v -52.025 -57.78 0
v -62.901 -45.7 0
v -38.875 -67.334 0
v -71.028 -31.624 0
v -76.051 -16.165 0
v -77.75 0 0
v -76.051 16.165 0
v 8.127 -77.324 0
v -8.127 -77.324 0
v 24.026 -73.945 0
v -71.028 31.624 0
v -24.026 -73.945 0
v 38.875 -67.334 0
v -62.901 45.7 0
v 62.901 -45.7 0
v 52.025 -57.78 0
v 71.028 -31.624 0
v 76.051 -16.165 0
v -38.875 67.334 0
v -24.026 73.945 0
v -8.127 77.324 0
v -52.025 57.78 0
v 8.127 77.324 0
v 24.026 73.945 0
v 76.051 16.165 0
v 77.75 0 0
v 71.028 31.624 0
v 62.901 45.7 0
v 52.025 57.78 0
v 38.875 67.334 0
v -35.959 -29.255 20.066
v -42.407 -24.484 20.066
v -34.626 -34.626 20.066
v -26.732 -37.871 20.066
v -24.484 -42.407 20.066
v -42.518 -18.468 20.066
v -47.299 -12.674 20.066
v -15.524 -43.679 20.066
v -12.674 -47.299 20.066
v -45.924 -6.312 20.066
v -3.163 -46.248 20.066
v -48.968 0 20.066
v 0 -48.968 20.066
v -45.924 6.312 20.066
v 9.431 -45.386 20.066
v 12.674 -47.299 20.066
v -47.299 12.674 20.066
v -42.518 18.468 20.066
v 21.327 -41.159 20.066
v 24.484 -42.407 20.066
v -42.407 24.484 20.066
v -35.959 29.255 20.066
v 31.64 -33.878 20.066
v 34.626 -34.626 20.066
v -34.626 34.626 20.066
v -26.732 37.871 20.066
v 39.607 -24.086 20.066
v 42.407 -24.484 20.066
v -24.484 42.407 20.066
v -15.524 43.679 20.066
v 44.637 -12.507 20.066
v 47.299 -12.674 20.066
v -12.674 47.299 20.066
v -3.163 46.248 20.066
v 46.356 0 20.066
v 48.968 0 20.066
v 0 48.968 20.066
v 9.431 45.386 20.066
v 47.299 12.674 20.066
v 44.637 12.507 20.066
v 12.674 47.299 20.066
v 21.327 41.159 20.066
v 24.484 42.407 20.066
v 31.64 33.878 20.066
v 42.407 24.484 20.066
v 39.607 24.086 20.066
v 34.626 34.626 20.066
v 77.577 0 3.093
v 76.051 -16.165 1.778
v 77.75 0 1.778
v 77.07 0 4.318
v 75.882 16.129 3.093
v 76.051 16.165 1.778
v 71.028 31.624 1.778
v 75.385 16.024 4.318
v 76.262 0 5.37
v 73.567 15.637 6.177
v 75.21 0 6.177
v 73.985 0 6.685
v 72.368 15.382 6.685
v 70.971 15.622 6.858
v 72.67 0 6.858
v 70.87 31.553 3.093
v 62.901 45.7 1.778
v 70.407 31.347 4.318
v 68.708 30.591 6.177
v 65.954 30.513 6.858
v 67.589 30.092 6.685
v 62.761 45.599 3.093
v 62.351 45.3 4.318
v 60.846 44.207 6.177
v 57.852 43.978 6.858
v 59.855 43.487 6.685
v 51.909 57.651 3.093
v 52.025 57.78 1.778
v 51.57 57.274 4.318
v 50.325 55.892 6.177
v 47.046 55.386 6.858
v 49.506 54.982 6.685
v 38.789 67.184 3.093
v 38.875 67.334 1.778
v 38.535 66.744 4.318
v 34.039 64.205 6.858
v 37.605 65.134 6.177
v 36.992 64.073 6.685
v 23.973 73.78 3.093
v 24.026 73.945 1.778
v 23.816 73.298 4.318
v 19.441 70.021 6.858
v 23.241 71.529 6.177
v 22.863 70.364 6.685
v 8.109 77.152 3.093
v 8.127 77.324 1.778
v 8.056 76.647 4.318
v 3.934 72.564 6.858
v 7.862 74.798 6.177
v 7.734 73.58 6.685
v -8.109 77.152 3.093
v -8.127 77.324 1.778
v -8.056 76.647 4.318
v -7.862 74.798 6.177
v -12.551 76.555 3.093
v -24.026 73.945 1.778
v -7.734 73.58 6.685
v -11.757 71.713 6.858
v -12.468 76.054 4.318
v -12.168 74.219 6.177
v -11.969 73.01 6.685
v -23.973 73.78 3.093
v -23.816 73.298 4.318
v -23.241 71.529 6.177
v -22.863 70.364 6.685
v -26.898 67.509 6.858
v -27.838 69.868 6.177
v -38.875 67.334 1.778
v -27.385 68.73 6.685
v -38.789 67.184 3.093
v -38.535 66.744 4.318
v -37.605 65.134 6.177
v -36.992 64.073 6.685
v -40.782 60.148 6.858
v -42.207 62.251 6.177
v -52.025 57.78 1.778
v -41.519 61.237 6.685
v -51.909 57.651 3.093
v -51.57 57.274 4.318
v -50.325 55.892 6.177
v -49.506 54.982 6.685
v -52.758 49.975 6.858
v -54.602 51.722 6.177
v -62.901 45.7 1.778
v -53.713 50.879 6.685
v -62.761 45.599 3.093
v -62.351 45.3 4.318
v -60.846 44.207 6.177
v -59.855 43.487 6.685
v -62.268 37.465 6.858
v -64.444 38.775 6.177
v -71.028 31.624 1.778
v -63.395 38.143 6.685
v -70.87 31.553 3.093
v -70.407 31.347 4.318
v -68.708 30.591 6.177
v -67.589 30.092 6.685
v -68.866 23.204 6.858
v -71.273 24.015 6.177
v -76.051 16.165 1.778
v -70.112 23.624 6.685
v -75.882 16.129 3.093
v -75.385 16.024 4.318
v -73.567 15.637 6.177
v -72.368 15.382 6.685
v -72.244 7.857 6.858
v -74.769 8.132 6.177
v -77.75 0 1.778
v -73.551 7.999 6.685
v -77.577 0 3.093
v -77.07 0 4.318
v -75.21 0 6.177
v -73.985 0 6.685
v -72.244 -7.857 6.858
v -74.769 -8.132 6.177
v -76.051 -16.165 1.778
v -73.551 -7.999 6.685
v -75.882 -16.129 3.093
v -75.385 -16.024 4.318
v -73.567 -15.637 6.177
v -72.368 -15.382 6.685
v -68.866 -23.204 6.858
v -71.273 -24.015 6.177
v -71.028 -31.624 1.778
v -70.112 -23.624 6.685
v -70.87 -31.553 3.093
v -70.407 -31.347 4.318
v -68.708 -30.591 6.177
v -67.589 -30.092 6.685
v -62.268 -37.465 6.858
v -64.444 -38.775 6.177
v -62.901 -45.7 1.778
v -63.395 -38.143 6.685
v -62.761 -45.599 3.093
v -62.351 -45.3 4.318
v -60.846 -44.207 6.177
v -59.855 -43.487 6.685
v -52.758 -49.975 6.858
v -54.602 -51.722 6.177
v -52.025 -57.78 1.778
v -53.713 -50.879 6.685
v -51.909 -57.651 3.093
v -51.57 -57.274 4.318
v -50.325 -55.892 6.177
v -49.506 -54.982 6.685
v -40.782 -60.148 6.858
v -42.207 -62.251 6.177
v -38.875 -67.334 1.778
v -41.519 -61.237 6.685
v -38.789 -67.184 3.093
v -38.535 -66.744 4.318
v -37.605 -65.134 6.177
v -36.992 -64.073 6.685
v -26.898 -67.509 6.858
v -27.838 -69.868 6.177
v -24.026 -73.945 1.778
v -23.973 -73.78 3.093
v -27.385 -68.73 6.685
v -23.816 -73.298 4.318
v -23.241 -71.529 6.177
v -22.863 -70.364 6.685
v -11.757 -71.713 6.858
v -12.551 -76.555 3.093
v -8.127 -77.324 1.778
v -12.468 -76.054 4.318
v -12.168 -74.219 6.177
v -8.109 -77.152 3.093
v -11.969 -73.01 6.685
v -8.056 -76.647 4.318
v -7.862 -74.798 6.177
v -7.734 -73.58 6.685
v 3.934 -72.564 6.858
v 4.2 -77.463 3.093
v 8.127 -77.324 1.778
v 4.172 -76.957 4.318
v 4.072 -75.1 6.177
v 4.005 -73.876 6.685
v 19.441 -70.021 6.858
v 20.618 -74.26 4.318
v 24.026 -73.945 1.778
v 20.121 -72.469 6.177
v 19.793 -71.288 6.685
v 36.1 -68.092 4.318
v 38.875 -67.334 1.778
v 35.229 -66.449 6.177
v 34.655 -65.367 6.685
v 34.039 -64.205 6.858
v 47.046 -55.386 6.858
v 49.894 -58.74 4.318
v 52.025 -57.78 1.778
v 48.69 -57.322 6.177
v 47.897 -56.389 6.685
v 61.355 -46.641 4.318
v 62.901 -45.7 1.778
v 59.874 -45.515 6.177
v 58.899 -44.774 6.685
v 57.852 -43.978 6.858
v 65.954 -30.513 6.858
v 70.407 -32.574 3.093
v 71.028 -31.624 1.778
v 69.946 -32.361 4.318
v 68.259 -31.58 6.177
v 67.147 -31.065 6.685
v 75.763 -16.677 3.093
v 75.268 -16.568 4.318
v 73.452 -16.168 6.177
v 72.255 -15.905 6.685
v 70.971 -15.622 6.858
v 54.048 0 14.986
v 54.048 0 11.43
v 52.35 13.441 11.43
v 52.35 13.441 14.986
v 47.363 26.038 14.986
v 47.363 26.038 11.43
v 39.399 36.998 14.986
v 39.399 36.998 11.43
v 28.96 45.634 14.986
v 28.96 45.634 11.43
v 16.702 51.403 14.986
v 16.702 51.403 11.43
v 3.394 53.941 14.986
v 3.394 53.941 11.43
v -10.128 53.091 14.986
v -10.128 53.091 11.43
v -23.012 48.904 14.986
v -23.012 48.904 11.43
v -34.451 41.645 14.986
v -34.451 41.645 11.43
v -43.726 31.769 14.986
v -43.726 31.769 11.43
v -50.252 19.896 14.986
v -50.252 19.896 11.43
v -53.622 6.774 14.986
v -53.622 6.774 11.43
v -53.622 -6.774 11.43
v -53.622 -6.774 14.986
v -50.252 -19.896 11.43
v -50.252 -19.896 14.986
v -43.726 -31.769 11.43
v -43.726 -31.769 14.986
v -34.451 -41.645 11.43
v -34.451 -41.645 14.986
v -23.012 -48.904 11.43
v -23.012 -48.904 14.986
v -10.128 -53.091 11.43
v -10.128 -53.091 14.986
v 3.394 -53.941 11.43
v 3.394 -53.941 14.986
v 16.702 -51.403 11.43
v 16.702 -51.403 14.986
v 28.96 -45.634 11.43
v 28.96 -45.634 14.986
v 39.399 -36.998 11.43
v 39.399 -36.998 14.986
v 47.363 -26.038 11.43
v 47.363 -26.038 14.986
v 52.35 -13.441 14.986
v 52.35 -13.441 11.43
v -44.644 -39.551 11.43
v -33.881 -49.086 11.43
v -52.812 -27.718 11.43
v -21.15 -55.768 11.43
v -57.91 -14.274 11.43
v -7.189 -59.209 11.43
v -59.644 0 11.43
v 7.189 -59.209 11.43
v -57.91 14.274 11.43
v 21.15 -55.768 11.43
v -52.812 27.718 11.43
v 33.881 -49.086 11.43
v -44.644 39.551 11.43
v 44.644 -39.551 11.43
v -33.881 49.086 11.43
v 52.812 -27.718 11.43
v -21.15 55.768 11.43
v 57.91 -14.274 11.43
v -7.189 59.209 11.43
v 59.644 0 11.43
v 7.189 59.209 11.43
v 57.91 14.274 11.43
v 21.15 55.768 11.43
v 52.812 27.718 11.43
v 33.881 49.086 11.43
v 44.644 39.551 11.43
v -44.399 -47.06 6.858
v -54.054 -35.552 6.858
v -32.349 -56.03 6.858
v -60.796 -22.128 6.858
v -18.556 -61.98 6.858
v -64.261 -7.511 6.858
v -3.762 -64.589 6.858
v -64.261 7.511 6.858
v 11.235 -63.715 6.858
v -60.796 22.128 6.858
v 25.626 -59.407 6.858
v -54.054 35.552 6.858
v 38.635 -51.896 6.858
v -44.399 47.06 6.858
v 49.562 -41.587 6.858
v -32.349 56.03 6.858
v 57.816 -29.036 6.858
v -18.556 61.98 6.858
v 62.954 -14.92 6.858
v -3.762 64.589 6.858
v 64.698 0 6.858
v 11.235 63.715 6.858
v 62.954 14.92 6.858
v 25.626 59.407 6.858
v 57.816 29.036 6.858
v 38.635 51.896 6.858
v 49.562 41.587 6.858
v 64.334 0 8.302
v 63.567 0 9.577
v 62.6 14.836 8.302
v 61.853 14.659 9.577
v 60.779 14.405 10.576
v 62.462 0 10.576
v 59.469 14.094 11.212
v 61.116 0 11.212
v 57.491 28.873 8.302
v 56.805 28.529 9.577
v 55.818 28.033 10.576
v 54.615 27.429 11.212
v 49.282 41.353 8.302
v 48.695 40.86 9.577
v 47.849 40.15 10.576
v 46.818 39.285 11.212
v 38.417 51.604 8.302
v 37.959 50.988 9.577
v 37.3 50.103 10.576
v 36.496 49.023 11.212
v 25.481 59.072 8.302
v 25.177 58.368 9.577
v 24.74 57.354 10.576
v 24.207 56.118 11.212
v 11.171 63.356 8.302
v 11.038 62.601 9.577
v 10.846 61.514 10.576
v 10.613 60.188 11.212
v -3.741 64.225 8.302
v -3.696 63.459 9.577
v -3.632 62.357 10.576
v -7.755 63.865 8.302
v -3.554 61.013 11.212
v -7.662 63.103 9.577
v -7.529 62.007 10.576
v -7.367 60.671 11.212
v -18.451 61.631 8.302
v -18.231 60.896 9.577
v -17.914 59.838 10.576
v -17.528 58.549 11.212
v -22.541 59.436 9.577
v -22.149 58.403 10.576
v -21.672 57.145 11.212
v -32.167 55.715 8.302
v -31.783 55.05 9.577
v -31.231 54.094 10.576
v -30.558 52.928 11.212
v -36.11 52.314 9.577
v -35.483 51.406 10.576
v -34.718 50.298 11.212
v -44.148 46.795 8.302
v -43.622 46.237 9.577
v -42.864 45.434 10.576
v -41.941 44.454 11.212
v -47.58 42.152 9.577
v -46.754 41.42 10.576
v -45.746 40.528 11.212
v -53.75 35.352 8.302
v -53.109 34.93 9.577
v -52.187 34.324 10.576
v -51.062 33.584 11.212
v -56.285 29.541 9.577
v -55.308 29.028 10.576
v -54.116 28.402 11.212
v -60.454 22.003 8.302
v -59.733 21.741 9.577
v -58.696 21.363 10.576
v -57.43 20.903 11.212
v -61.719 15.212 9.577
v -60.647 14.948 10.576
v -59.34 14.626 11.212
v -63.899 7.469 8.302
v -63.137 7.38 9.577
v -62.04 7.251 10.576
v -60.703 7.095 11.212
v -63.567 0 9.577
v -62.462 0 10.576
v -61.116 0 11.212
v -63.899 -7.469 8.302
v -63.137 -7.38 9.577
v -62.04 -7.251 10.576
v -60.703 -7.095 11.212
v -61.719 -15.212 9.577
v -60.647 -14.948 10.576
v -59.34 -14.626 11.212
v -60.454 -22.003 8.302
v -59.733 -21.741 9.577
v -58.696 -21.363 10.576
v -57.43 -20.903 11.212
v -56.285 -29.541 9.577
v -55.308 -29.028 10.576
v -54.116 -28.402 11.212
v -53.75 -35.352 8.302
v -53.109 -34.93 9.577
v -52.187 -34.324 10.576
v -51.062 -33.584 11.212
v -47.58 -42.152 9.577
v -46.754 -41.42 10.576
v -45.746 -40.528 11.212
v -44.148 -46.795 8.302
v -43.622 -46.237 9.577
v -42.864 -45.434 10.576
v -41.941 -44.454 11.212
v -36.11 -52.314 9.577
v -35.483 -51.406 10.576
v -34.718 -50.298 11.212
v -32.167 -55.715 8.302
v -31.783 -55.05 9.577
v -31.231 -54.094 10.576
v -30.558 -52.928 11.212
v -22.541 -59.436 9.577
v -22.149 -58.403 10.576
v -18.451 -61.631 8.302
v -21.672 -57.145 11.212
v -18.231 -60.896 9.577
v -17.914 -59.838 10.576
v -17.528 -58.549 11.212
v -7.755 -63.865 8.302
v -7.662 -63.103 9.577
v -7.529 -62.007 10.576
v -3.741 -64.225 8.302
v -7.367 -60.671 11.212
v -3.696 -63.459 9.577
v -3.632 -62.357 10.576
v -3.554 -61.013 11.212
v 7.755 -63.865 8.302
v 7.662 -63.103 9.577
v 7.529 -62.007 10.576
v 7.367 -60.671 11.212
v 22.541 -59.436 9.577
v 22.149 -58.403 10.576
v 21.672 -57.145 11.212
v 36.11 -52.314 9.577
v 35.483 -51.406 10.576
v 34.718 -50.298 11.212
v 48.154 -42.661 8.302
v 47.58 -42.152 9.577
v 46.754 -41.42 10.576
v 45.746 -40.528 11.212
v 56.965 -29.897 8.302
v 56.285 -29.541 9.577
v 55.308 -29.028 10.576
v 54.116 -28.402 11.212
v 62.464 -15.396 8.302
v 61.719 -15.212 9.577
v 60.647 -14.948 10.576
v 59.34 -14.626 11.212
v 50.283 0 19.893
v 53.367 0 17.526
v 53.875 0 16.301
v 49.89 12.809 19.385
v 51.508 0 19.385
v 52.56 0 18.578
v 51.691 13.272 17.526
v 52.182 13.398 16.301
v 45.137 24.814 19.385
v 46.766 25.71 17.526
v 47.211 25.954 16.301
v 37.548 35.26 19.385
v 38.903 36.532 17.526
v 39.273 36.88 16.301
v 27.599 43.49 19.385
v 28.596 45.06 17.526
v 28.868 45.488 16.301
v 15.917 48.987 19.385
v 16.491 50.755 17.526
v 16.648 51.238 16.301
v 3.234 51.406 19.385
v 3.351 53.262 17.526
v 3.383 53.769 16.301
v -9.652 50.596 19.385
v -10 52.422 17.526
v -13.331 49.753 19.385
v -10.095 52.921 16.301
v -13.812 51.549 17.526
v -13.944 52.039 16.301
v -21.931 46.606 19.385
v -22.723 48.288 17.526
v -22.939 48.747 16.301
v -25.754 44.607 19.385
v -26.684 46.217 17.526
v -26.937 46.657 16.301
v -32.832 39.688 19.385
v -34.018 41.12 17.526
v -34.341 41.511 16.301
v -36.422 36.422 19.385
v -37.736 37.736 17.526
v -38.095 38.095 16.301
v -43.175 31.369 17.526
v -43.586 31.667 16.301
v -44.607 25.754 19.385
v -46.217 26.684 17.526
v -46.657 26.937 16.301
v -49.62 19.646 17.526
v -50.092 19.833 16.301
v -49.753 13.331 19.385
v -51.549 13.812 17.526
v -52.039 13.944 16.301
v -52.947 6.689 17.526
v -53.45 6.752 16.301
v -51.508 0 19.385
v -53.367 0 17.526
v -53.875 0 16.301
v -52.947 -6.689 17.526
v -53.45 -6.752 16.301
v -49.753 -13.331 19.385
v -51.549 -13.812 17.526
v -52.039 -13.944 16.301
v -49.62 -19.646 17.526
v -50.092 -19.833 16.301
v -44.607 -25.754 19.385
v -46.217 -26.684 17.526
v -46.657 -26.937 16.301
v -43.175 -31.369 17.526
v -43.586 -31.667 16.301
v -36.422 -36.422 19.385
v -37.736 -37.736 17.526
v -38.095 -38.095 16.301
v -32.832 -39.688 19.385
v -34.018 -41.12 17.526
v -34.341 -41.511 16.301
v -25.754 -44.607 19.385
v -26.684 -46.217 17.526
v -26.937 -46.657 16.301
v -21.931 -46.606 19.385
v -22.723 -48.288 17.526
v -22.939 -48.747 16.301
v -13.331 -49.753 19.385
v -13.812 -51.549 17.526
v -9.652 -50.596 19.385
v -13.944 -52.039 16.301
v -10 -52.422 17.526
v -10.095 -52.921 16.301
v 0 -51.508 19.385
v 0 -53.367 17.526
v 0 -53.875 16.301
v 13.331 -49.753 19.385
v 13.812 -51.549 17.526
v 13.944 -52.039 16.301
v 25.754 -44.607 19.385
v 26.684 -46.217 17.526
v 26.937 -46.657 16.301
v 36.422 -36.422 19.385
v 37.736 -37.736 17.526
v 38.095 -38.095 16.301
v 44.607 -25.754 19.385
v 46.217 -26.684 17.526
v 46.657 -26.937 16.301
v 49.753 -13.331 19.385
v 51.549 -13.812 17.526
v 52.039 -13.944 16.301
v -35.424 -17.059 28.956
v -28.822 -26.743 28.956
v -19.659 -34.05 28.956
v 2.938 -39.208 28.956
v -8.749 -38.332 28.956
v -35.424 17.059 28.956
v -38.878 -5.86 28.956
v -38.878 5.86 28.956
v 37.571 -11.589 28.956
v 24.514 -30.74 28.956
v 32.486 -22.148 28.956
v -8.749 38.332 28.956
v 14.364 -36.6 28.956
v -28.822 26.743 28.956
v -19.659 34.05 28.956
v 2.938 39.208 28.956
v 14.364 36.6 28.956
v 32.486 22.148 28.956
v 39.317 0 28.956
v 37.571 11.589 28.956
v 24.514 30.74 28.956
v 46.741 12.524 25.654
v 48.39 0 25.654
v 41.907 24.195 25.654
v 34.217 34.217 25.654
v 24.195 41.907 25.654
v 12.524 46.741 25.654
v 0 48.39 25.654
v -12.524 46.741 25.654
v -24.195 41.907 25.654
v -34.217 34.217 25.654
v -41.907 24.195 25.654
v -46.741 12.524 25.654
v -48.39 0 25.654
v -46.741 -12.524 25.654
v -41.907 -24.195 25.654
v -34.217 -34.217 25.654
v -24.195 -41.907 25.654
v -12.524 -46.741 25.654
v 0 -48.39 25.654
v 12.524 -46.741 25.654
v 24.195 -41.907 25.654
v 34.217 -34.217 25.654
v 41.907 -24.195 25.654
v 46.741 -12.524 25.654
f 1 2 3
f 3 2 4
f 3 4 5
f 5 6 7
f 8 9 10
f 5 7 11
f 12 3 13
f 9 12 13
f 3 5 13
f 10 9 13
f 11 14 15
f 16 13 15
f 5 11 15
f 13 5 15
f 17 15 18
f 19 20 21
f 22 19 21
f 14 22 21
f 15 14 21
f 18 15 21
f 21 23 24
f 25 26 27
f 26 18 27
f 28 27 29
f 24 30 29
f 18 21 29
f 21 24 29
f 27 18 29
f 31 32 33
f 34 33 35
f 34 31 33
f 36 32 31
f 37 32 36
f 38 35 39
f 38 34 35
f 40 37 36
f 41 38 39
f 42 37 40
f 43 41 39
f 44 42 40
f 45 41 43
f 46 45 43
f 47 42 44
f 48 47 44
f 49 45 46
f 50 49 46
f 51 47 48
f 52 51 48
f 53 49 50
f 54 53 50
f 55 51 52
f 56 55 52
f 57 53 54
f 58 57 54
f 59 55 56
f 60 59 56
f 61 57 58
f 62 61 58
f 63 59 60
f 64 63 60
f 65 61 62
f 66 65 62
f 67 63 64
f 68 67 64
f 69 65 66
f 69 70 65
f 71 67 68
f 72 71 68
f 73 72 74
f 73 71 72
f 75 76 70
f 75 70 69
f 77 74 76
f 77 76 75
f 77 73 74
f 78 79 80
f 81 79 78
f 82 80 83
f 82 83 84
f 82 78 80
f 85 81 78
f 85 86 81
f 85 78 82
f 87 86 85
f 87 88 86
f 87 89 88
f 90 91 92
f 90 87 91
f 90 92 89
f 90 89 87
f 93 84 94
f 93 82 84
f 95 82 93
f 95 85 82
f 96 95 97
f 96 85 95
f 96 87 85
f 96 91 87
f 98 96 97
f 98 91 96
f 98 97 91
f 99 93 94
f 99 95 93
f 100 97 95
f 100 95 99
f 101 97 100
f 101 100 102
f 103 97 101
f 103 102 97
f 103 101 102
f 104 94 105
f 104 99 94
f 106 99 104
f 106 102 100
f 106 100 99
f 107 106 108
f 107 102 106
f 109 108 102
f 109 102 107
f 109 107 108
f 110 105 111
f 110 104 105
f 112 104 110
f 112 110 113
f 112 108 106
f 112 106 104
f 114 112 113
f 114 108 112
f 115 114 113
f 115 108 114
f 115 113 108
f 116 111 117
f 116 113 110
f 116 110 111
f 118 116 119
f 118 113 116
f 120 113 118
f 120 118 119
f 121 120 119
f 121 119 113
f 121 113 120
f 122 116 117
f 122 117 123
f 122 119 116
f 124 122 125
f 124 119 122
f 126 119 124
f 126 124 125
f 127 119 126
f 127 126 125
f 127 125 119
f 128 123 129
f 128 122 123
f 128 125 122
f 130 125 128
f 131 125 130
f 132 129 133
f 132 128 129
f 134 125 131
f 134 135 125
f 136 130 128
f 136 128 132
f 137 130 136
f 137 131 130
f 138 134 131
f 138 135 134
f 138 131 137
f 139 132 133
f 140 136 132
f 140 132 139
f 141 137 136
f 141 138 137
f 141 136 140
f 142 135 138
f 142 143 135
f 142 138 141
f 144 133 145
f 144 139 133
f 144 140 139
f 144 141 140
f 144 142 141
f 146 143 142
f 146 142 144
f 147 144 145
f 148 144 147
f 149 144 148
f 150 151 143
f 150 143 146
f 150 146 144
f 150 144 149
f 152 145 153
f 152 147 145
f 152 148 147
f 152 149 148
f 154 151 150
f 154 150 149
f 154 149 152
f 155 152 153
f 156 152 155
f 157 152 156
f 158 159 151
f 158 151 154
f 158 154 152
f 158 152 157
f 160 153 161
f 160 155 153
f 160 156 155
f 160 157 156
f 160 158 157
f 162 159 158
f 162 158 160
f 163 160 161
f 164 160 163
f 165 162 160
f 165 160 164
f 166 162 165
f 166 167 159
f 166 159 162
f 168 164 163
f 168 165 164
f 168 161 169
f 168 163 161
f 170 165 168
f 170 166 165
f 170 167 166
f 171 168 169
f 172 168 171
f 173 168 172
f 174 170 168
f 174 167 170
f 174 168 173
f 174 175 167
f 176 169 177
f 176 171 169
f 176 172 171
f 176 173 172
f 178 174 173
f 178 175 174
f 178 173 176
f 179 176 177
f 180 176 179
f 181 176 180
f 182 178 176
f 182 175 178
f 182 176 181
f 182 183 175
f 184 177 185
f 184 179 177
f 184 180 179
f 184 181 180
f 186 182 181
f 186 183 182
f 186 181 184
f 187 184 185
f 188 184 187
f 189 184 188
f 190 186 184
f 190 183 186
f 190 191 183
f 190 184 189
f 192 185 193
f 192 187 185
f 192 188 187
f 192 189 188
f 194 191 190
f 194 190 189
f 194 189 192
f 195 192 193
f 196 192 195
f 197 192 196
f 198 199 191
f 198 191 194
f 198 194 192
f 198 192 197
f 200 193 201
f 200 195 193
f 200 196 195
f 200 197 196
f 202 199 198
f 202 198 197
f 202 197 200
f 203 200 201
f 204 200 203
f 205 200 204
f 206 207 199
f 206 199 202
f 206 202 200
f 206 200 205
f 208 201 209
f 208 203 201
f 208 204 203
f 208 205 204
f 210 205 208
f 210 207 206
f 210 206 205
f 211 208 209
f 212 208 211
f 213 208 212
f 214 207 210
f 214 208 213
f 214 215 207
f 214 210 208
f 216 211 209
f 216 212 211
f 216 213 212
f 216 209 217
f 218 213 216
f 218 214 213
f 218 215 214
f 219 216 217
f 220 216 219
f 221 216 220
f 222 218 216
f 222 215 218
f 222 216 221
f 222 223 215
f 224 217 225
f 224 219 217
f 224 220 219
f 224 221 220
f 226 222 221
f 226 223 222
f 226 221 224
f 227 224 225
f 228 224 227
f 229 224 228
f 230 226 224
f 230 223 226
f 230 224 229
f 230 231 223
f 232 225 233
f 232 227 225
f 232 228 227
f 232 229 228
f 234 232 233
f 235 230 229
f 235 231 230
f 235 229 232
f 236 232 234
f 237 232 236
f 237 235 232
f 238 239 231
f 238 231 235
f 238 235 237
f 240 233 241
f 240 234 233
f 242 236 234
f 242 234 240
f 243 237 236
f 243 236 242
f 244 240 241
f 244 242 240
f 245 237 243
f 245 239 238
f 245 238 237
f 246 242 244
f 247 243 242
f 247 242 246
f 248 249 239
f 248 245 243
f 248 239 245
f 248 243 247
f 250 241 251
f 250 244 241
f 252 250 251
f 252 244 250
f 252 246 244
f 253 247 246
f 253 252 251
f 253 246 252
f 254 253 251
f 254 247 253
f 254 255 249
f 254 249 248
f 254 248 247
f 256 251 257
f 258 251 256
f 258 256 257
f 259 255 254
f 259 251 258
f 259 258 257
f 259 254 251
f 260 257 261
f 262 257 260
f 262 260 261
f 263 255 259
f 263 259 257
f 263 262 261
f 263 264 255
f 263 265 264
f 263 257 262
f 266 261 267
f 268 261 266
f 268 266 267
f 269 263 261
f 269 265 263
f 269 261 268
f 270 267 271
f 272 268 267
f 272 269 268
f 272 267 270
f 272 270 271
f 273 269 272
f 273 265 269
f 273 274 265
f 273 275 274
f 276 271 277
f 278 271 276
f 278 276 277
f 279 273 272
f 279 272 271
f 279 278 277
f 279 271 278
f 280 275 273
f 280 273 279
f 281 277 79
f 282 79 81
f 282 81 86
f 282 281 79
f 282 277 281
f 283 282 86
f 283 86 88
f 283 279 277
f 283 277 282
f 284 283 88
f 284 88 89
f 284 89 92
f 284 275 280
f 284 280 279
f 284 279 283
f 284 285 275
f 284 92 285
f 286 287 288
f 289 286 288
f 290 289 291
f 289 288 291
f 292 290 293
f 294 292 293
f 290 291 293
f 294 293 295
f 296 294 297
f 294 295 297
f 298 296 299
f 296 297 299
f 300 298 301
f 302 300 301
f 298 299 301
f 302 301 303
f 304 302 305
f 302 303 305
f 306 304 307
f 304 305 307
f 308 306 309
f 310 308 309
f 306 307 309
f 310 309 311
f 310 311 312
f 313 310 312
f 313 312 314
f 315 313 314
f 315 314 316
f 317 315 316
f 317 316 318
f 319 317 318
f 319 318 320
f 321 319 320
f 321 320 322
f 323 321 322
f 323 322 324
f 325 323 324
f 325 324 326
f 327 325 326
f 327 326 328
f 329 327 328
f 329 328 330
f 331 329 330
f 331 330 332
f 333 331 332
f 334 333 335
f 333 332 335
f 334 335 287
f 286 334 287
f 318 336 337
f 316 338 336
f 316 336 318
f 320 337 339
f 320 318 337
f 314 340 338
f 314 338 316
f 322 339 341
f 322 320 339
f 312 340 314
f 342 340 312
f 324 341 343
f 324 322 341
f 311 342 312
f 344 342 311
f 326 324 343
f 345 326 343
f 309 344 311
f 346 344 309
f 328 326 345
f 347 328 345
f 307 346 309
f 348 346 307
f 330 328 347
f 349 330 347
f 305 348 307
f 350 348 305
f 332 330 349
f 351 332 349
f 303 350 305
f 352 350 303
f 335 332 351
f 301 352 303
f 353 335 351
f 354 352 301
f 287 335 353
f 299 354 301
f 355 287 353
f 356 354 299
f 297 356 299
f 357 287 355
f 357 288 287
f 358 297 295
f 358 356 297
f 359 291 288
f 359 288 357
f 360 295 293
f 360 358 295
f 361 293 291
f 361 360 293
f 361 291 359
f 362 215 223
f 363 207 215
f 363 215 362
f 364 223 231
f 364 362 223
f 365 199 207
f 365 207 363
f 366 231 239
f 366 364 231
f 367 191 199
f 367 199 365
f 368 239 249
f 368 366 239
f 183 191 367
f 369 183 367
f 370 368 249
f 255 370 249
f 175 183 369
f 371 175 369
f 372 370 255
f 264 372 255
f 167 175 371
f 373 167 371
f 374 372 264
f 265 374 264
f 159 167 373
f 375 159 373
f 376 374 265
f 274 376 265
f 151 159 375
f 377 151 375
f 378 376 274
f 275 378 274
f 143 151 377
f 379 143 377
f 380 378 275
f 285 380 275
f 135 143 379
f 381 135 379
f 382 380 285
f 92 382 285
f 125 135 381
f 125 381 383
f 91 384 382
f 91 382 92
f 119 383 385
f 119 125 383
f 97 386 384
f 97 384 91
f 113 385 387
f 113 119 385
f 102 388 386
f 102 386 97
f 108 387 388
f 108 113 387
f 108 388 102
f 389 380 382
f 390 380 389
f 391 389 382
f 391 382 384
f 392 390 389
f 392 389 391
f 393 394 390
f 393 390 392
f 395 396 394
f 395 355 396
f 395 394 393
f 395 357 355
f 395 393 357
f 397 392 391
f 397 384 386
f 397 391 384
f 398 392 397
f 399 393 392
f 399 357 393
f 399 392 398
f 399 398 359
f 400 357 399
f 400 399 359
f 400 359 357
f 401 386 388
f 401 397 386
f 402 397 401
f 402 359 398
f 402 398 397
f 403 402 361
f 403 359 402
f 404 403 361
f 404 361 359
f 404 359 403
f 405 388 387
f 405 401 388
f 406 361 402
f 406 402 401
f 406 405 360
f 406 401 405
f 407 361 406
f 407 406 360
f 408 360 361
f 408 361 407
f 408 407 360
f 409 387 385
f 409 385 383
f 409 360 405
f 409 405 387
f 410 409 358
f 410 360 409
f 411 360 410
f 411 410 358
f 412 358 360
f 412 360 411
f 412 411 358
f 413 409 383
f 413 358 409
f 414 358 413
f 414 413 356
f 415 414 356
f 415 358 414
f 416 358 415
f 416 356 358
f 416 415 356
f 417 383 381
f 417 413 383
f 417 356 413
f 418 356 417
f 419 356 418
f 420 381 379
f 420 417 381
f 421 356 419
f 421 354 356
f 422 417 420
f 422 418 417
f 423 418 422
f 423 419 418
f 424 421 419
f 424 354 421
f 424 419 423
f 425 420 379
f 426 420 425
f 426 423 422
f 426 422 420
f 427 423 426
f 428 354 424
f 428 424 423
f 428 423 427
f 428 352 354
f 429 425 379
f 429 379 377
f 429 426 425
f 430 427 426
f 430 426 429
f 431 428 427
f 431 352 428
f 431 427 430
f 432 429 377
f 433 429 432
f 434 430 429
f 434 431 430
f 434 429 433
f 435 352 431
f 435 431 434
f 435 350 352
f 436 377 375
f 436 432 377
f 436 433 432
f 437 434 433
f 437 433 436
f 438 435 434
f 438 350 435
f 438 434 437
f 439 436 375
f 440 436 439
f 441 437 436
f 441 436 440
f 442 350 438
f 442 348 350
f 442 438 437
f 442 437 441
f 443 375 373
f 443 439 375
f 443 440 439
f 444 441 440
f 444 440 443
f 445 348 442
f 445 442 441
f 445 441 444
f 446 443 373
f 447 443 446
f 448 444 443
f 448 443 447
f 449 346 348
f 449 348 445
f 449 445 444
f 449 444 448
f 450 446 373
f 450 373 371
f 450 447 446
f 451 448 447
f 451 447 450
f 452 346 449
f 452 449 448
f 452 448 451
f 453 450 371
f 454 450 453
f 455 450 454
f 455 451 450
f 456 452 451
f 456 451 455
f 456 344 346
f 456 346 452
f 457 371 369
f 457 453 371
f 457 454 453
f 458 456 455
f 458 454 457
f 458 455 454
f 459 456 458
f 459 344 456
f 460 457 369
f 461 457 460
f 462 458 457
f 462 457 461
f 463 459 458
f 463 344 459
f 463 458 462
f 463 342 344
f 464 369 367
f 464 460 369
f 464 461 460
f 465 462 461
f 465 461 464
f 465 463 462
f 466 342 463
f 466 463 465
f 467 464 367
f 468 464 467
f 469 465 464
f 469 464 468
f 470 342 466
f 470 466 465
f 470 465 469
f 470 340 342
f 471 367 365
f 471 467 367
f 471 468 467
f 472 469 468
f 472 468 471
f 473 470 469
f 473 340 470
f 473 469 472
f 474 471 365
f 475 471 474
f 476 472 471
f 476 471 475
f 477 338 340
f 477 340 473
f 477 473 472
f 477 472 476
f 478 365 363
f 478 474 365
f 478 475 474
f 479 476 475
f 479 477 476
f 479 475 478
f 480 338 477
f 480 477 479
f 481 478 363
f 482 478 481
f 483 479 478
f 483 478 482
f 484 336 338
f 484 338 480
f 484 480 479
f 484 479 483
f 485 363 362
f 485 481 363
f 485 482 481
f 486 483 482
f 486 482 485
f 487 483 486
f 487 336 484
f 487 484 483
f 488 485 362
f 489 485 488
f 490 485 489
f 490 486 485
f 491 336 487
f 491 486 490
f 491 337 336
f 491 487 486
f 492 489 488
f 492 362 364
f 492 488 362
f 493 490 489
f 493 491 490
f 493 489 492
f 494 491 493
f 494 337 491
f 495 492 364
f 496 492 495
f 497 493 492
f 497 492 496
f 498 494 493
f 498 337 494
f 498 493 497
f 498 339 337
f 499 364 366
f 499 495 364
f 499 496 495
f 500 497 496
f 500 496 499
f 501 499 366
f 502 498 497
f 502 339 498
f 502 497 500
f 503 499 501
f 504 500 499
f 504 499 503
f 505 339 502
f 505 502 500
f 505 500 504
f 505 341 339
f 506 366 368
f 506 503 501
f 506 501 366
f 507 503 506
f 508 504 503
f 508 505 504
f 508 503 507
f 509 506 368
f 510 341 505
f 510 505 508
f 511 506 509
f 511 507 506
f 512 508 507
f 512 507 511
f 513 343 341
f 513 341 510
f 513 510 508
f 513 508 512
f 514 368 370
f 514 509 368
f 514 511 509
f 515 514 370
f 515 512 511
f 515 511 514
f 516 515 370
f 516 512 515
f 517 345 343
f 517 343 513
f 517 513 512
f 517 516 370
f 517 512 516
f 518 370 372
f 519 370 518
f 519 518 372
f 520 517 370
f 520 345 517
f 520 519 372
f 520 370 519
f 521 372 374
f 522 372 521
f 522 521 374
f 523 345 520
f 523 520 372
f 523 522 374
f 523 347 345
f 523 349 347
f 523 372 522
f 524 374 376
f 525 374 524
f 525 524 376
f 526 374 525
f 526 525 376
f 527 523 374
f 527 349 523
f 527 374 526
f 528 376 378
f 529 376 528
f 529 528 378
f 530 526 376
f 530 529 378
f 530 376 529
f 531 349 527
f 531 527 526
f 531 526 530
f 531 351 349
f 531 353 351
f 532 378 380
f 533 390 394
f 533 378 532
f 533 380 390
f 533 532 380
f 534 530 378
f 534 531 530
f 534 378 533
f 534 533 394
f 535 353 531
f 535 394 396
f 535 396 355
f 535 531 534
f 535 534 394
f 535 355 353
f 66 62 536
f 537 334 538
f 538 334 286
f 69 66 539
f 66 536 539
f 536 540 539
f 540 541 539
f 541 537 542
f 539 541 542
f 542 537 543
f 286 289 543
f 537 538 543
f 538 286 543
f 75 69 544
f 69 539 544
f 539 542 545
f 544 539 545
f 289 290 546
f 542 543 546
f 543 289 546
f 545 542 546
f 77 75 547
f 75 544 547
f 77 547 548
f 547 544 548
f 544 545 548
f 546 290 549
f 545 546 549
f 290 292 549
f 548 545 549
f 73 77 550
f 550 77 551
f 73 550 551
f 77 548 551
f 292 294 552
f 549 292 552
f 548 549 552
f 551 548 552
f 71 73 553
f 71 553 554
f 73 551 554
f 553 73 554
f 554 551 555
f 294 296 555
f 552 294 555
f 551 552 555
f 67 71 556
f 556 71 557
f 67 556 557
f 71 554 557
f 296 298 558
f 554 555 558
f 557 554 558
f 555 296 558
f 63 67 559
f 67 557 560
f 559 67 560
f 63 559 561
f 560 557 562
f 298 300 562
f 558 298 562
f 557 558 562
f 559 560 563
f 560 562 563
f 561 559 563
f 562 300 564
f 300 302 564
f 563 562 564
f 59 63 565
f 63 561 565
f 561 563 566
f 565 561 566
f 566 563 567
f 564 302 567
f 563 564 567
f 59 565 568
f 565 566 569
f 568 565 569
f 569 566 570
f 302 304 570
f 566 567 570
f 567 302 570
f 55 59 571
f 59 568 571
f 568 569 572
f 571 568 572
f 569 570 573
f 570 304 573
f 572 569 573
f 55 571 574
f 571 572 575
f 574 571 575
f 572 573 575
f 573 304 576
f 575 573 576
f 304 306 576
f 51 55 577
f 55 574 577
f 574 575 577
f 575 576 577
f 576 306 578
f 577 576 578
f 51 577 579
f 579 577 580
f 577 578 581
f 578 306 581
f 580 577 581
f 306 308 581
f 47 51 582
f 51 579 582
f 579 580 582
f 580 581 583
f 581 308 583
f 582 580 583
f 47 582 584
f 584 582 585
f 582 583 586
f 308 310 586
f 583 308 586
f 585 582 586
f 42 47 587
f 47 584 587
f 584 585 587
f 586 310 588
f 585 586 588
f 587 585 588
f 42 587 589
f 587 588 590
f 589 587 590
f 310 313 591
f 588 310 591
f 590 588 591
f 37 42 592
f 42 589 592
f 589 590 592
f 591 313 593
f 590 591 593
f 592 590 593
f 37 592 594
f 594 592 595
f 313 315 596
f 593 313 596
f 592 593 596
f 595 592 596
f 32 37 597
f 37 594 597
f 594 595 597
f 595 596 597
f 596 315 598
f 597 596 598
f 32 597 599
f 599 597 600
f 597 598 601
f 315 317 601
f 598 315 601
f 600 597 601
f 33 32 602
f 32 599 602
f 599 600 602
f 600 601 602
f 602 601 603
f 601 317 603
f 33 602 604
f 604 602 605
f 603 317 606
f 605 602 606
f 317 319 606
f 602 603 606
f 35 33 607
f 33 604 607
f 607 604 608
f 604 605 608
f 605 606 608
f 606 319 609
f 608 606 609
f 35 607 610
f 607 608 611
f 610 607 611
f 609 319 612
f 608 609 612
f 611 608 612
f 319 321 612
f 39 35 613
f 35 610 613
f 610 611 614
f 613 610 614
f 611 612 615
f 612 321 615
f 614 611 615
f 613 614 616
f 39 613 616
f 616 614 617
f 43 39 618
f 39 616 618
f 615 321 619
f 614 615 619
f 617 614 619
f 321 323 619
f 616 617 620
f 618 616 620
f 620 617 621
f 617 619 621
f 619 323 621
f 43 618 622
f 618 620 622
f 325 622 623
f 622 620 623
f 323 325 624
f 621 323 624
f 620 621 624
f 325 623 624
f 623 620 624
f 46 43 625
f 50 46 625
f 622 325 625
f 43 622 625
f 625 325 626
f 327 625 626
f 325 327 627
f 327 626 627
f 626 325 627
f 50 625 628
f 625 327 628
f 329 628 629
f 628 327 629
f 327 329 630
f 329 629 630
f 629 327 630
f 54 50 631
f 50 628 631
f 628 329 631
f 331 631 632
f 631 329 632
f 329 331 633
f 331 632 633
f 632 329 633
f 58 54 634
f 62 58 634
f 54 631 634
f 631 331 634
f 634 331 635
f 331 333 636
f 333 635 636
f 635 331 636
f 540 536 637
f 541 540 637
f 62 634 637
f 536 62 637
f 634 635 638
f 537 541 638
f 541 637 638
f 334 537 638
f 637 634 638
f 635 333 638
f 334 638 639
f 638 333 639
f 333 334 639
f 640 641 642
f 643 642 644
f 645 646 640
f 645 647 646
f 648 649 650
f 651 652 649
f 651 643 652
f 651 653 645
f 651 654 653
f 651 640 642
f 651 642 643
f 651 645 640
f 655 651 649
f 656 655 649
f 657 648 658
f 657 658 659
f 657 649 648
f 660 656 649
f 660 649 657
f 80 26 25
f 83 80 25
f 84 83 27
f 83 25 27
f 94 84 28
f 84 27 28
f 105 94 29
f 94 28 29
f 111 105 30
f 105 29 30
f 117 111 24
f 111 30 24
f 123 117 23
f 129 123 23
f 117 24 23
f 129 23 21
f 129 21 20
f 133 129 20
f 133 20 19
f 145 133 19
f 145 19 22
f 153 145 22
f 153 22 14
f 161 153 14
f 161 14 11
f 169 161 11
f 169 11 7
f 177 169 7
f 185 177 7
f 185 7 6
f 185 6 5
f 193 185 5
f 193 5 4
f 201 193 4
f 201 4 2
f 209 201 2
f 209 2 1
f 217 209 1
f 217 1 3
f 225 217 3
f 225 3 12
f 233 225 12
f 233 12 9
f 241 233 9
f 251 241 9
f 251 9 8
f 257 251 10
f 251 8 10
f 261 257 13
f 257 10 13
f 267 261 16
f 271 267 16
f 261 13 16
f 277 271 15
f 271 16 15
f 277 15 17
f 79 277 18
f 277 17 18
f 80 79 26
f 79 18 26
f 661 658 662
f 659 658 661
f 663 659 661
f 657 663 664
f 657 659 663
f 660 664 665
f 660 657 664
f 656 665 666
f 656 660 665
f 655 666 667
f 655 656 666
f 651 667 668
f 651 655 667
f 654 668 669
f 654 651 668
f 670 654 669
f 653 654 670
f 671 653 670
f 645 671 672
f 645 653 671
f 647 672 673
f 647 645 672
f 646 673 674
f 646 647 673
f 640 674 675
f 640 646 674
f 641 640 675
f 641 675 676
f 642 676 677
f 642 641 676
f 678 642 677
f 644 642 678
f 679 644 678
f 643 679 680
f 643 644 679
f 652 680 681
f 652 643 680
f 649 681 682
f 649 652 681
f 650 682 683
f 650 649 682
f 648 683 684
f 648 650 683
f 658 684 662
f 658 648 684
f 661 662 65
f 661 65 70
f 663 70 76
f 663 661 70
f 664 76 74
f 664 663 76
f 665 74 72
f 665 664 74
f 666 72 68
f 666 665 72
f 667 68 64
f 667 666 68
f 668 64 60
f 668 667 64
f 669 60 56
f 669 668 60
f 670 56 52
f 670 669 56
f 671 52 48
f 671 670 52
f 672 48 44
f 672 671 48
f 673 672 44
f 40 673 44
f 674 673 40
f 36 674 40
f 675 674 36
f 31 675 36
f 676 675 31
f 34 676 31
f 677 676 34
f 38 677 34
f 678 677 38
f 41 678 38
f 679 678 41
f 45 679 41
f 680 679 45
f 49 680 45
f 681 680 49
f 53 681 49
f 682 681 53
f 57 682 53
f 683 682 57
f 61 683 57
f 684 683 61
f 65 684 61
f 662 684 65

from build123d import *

# Parameters (mm, degrees)
F0_R      = 77.7501635543
F0_R_2    = 64.6980648952
F1_DEPTH  = 6.858
F0_R_3    = 54.0479242204
F2_DEPTH  = 11.43
F0_R_4    = 39.0523448649
F3_DEPTH  = 20.066
F5_DEPTH  = 25.654
F5_TAPER  = -20
F5_FACE_R = 48.3896372547
F6_DEPTH  = 3.302
F6_TAPER  = 70


# Not quite as in the source:
# - a fillet or chamfer that OpenCascade refuses, or shapes differently, is made with other operations: its cross-section is extruded or revolved along the edge and cut away or added


with BuildPart() as f1:
    # F0 (on Top) → F1 (new body)
    with BuildSketch(Plane.XY):
        Circle(F0_R)
        Circle(F0_R_2, mode=Mode.SUBTRACT)
    extrude(amount=F1_DEPTH)

    # F0 (on Top) → F2 (join)
    with BuildSketch(Plane.XY):
        Circle(F0_R_2)
        Circle(F0_R_3, mode=Mode.SUBTRACT)
    extrude(amount=F2_DEPTH)

    # F0 (on Top) → F3 (join)
    with BuildSketch(Plane.XY):
        Circle(F0_R_3)
        Circle(F0_R_4, mode=Mode.SUBTRACT)
    extrude(amount=F3_DEPTH)

    # F4: fillet of radius 5.08 on 3 edges, made by hand

    # F4_s1 → F4_t2 (revolve, cut)
    with BuildSketch(Plane.XZ):
        with BuildLine():
            ThreePointArc((48.9679242204, 20.066), (52.5600266688, 18.5781024484), (54.0479242204, 14.986))
            Line((54.0479242204, 14.986), (54.0479242204, 20.066))
            Line((54.0479242204, 20.066), (48.9679242204, 20.066))
        make_face()
    revolve(axis=Axis((0, 0, 20.066), (0, 0, 1)), mode=Mode.SUBTRACT)

    # F4_s3 → F4_t4 (revolve, cut)
    with BuildSketch(Plane.XZ):
        with BuildLine():
            ThreePointArc((64.6980648952, 6.858), (63.0512963124, 10.1174288314), (59.6435287147, 11.43))
            Line((59.6435287147, 11.43), (64.6980648952, 11.43))
            Line((64.6980648952, 11.43), (64.6980648952, 6.858))
        make_face()
    revolve(axis=Axis((0, 0, 11.43), (0, 0, 1)), mode=Mode.SUBTRACT)

    # F4_s5 → F4_t6 (revolve, cut)
    with BuildSketch(Plane.XZ):
        with BuildLine():
            ThreePointArc((77.7501635543, 1.778), (76.2622660027, 5.3701024484), (72.6701635543, 6.858))
            Line((72.6701635543, 6.858), (77.7501635543, 6.858))
            Line((77.7501635543, 6.858), (77.7501635543, 1.778))
        make_face()
    revolve(axis=Axis((0, 0, 6.858), (0, 0, 1)), mode=Mode.SUBTRACT)

    # F0 (on Top) → F5 (join)
    with BuildSketch(Plane.XY):
        Circle(F0_R_4)
    extrude(amount=F5_DEPTH, taper=F5_TAPER)

    # F5_face (on face) → F6 (join)
    with BuildSketch(Plane.XY.offset(25.654)):
        Circle(F5_FACE_R)
    extrude(amount=F6_DEPTH, taper=F6_TAPER)


solid = f1.part
